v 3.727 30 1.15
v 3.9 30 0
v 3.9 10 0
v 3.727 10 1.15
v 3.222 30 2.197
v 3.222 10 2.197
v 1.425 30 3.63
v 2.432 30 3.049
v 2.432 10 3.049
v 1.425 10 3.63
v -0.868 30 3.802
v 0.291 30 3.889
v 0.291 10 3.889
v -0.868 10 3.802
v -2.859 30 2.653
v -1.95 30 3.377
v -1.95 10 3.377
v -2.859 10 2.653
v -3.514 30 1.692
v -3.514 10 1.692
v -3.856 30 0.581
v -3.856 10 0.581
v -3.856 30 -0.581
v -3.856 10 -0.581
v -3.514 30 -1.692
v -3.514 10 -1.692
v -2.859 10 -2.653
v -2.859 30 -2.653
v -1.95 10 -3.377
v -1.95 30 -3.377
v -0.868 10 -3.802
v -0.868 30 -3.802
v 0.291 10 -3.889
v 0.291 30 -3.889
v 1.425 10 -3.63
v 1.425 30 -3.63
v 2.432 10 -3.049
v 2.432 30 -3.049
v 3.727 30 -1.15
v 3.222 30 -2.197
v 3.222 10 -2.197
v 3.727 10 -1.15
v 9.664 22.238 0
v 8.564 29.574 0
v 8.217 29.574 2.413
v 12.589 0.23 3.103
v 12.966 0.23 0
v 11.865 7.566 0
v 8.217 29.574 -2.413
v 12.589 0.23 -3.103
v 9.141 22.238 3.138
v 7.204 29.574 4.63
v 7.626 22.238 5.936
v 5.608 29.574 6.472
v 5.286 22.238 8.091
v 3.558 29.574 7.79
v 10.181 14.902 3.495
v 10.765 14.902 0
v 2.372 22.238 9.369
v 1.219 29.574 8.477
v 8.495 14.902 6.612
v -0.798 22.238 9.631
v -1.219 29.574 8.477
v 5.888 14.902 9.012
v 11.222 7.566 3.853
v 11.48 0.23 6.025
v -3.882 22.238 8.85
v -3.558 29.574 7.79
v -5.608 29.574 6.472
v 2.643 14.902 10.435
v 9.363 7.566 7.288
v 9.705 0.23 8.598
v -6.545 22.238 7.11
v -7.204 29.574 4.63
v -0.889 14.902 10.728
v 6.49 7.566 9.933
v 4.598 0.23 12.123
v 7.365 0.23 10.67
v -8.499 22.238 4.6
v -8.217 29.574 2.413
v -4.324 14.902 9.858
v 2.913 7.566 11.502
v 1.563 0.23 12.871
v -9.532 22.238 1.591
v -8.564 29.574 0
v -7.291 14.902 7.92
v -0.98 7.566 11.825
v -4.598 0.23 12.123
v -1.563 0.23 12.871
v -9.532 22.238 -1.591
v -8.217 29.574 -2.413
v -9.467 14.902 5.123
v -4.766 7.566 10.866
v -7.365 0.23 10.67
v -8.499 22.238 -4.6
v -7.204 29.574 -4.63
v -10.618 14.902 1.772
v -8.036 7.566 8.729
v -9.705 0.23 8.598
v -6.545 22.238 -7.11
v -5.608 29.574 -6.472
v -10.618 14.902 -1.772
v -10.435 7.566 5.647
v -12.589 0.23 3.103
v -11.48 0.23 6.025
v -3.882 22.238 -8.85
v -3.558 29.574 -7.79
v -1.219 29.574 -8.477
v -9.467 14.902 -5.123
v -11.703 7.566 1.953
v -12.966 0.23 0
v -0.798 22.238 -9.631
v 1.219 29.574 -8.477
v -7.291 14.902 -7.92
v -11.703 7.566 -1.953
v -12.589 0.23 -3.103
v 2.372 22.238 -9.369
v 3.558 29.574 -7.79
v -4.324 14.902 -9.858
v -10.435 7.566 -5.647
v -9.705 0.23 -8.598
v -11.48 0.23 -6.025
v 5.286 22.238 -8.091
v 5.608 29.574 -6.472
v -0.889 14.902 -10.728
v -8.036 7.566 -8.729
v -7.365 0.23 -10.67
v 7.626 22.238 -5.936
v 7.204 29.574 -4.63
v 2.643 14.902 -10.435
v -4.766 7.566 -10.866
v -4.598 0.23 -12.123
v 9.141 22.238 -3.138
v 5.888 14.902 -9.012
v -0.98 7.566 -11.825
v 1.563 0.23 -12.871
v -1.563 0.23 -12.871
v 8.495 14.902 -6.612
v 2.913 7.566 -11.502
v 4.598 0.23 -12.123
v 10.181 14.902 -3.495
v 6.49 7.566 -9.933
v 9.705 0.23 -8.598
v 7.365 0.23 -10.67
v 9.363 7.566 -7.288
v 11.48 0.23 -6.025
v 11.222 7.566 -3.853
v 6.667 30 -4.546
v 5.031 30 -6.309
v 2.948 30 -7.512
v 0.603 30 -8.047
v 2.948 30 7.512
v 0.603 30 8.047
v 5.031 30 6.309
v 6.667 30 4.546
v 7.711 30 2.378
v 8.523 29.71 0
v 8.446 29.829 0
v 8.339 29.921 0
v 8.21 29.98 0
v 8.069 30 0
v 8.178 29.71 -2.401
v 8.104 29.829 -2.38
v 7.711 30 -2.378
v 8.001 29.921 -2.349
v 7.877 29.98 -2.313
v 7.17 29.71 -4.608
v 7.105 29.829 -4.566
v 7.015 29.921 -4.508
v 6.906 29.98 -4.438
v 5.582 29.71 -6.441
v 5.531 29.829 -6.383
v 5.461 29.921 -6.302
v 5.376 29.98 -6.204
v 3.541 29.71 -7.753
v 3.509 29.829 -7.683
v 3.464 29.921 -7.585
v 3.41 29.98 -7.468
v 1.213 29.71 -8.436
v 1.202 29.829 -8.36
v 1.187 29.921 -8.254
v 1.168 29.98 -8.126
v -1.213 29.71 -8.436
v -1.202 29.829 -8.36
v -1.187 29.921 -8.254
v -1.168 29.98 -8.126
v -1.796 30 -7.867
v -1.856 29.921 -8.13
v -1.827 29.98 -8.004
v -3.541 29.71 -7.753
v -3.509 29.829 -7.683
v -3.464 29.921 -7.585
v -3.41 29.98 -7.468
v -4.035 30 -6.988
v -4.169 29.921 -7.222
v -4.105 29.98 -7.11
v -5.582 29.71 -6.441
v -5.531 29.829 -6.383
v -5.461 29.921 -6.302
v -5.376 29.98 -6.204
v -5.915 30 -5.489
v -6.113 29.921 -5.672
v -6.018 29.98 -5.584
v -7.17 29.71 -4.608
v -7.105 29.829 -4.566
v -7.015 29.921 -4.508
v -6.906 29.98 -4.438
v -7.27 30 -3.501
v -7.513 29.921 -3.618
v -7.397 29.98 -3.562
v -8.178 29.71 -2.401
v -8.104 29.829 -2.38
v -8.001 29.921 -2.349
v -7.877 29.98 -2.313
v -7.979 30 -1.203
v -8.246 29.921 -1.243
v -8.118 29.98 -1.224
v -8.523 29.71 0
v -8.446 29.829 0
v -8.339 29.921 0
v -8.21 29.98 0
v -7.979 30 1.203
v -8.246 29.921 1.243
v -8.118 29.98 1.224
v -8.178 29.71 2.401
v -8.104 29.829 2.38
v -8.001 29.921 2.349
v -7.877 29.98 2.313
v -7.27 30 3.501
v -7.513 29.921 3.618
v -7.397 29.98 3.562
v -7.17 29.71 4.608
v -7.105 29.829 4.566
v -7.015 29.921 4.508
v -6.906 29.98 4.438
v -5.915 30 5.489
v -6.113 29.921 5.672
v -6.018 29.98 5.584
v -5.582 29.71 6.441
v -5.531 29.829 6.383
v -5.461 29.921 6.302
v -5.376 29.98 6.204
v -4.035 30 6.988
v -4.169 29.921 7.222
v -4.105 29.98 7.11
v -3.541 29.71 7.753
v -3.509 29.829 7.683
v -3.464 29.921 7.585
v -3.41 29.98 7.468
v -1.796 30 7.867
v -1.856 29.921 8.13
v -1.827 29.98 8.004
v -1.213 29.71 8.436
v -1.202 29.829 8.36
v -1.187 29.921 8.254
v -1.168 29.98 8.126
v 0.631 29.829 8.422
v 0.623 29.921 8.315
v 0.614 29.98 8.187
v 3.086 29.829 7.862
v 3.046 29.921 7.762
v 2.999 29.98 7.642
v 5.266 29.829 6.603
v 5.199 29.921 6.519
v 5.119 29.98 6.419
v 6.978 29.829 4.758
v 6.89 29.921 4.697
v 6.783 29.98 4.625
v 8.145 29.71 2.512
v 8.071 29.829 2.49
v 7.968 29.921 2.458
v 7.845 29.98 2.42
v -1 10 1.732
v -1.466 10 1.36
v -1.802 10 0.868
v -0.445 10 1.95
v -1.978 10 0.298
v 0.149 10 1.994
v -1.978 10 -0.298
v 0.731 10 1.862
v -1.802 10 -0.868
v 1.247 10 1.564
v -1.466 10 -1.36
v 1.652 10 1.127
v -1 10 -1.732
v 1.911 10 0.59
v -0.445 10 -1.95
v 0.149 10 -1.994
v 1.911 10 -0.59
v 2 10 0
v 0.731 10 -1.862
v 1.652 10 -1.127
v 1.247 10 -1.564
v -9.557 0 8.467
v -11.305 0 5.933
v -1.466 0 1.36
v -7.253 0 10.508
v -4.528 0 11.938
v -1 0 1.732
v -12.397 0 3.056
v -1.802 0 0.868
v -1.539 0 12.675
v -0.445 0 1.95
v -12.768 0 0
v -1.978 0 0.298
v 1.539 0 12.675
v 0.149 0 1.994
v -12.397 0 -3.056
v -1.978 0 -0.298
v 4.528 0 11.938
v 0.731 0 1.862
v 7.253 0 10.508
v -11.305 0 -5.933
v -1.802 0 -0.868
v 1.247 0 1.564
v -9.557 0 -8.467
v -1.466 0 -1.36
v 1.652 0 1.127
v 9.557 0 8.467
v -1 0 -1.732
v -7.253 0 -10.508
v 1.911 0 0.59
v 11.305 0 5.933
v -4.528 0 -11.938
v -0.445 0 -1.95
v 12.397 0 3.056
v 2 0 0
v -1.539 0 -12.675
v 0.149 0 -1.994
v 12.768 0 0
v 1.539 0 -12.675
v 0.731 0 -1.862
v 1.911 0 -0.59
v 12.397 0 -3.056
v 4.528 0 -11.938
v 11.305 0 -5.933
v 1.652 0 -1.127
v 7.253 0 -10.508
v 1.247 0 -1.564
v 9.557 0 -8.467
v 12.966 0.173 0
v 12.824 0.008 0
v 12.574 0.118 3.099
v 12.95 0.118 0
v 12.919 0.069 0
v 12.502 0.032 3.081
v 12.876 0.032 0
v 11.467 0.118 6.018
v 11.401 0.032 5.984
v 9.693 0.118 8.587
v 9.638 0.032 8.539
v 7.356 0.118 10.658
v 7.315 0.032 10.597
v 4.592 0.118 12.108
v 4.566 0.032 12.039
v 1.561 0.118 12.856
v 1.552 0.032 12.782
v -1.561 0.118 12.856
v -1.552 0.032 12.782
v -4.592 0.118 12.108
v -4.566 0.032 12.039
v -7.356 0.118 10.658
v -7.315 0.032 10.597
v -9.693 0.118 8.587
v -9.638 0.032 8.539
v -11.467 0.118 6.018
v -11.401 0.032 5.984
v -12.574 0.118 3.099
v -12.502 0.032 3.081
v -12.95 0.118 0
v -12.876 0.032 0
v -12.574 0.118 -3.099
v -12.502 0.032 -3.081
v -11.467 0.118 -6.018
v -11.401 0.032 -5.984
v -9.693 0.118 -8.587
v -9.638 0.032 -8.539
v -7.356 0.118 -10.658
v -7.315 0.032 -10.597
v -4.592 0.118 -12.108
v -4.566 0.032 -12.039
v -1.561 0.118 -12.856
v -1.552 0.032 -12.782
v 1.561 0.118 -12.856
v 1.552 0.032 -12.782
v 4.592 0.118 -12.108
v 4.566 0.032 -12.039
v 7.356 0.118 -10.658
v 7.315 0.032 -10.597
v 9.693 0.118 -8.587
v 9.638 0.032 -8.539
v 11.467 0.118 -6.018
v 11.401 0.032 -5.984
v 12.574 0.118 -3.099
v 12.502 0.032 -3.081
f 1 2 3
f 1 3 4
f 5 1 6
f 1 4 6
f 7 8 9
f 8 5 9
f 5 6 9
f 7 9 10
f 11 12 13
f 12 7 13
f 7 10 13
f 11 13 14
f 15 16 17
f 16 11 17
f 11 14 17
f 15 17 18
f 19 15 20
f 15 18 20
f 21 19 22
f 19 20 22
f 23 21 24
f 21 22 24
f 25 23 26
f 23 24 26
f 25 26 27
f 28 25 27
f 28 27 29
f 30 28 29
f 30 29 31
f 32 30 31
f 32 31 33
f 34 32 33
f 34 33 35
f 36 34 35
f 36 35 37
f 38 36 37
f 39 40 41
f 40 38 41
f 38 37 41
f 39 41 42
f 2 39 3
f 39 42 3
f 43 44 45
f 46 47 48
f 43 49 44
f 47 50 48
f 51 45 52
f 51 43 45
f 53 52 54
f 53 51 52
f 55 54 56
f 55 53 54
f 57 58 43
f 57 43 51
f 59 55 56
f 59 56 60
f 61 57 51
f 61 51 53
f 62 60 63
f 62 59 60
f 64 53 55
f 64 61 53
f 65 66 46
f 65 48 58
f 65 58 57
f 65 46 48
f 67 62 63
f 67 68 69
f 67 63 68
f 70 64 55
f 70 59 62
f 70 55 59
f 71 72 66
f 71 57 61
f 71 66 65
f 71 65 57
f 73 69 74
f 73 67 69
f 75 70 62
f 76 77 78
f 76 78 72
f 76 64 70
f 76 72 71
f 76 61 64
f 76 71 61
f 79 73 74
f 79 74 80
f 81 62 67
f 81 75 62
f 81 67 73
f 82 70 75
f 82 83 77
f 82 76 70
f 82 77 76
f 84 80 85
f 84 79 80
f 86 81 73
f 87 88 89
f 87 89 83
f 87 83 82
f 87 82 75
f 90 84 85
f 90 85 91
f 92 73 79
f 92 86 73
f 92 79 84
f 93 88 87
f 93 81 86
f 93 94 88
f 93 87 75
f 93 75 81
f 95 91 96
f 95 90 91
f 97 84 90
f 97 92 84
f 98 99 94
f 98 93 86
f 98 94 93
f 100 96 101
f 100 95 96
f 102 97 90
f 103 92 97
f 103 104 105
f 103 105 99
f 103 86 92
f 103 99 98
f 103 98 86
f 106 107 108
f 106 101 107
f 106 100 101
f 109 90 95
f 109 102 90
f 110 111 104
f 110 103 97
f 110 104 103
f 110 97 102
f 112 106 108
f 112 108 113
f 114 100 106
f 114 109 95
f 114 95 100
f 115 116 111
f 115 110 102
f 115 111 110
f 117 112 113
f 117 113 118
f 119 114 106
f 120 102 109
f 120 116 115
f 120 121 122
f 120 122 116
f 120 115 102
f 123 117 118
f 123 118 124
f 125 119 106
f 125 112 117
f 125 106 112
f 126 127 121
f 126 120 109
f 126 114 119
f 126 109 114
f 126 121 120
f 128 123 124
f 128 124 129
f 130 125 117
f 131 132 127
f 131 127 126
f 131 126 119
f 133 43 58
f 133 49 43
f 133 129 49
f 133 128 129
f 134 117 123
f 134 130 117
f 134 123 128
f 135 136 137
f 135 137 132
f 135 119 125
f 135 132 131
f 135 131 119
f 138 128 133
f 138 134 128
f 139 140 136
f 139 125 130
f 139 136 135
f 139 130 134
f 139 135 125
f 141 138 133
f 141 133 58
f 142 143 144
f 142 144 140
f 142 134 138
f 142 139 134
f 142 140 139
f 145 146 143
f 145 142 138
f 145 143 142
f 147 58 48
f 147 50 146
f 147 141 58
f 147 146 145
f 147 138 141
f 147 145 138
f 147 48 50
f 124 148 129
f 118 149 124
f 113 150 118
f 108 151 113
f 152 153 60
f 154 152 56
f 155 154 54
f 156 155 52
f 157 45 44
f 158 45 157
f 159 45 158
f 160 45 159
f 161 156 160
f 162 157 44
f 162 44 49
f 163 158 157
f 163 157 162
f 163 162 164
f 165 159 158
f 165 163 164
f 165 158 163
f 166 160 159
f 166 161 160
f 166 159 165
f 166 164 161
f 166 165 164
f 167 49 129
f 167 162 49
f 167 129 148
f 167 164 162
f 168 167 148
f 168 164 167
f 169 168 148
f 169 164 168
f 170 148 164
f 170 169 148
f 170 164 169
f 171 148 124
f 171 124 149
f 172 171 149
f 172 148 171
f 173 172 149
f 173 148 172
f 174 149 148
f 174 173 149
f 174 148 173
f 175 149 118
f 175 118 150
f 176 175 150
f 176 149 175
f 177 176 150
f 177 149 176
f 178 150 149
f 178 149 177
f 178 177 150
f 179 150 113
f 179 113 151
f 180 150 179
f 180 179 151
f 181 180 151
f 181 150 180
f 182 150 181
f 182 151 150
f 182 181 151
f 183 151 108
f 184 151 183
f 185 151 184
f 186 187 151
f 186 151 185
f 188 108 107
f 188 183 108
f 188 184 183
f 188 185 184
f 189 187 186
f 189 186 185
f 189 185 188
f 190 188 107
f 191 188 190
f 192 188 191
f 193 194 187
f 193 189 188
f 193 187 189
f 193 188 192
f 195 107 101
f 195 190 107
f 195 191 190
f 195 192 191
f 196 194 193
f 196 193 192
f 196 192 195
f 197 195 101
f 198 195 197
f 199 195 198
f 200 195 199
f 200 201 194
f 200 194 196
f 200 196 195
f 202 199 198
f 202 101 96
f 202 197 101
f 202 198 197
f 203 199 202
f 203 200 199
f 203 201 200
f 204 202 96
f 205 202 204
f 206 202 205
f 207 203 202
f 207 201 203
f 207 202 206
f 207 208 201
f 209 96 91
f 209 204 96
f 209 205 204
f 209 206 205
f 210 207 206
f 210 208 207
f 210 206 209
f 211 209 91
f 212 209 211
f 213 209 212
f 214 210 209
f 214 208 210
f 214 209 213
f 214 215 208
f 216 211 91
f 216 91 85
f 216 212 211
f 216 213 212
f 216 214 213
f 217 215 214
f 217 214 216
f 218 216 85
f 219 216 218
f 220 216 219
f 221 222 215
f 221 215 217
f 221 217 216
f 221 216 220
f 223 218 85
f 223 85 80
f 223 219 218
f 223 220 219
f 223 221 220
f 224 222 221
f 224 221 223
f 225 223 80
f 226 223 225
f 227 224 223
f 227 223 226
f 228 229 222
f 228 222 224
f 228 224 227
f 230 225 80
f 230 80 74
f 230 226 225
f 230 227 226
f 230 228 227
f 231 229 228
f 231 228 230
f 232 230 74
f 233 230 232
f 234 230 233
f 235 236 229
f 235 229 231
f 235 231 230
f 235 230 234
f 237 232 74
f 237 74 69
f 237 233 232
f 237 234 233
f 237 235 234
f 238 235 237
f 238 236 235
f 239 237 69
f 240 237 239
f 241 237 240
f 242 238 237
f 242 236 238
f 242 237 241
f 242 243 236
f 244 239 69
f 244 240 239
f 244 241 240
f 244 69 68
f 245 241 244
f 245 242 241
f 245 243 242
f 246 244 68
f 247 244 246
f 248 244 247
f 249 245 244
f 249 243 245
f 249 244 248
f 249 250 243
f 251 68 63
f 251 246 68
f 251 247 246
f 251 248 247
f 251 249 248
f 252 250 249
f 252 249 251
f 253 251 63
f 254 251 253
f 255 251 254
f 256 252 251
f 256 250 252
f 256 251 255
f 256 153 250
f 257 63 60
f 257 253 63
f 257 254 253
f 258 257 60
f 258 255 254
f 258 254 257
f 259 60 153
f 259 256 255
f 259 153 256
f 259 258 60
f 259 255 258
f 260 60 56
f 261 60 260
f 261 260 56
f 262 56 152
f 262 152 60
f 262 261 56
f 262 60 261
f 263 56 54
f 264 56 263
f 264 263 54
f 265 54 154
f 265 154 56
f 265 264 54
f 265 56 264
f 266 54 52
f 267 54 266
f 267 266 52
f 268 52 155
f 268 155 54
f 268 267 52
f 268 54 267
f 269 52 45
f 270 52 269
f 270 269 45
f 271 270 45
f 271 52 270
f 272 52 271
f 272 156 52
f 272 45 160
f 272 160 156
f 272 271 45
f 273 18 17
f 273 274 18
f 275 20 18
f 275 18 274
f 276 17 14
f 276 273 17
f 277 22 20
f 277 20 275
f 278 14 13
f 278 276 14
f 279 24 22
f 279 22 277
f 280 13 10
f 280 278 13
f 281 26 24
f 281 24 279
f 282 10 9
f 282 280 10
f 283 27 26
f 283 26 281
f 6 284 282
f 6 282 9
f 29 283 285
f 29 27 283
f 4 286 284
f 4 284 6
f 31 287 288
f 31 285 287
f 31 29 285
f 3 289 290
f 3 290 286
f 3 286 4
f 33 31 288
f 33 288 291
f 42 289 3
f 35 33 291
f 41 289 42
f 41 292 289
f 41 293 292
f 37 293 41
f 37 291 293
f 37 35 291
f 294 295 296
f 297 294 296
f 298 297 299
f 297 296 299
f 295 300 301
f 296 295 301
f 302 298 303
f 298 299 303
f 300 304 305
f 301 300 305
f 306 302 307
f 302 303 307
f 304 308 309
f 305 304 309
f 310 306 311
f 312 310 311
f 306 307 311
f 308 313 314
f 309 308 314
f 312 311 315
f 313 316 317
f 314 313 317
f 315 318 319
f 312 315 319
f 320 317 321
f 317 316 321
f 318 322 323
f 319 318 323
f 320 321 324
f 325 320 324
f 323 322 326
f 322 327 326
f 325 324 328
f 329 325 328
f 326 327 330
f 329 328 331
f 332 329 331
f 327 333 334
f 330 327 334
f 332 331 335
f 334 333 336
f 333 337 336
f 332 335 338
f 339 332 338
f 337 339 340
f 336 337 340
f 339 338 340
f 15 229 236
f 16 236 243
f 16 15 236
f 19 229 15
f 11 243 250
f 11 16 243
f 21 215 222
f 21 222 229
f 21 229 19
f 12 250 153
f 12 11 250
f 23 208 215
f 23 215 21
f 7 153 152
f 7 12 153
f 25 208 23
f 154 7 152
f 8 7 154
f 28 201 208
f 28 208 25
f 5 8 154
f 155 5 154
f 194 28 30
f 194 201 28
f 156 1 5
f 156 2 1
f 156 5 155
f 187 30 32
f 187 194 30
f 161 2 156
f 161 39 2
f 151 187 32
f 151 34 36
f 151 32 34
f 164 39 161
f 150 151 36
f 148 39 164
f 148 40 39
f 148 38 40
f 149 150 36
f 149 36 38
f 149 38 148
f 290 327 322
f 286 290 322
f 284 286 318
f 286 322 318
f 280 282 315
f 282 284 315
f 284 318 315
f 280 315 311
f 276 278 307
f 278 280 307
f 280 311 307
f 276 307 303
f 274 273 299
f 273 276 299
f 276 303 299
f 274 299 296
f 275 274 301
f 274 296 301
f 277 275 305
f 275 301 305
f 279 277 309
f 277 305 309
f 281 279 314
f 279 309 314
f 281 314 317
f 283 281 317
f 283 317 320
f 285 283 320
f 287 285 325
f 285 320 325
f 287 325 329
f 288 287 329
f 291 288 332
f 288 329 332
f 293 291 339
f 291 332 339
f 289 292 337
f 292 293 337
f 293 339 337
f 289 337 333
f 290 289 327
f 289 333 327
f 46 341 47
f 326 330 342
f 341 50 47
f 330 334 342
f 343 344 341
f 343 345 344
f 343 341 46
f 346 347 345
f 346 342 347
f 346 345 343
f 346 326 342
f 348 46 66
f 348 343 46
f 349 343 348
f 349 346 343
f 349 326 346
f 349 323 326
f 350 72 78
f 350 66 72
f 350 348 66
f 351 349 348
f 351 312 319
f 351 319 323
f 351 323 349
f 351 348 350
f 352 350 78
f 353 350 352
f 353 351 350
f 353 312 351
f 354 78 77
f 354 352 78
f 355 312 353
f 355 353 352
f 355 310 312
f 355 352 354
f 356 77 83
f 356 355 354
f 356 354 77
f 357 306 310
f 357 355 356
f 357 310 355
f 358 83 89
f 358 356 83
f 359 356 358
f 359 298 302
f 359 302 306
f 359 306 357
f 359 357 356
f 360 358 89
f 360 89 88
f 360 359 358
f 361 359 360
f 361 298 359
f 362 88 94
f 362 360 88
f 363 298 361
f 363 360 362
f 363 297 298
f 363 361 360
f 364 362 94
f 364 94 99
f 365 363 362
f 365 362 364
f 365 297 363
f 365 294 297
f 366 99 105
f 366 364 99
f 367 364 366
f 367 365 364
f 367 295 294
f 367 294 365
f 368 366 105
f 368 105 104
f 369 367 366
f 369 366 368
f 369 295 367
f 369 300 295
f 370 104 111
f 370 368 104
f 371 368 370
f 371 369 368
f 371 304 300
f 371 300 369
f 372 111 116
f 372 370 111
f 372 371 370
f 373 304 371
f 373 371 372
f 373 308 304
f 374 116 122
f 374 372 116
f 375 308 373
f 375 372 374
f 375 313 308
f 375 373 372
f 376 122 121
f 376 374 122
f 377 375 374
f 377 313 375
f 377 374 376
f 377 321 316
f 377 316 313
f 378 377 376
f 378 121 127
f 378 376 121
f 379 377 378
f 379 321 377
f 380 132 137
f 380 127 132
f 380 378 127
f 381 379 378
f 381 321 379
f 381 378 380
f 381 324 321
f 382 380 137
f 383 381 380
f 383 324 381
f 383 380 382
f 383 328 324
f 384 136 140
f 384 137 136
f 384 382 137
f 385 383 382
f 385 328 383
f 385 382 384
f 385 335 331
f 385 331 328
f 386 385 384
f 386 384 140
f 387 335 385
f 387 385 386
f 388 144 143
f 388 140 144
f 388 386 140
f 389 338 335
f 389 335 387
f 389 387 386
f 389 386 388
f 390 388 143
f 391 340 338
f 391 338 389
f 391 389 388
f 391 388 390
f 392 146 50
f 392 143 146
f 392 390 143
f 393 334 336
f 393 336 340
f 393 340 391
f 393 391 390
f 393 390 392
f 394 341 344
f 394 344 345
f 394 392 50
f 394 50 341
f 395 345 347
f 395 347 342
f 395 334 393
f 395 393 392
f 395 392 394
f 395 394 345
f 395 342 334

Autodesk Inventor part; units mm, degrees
ref_plane "YZ Plane" through (0, 0, 0) normal (1, 0, 0) x (0, 1, 0)
ref_plane "XZ Plane" through (0, 0, 0) normal (0, 1, 0) x (-1, 0, 0)
ref_plane "XY Plane" through (0, 0, 0) normal (0, 0, 1) x (1, 0, 0)
sketch "Эскиз1" plane through (0, 0, 0) normal (0, 0, 1) x (1, 0, 0)
  line L0 (0, 0) -> (0, 30)
  line L1 (3.9, 30) -> (8.5, 30)
  line L2 (8.5, 30) -> (13, 0)
  line L3 (0, 0) -> (13, 0)
  line L4 (3.9, 30) -> (3.9, 10)
  line L5 (3.9, 10) -> (2, 10)
  line L6 (2, 10) -> (2, 0)
  dimension "d0" = 30
  dimension "d1" = 4
  dimension "d2" = 7.8
  dimension "d3" = 17
  dimension "d4" = 26
  dimension "d8" = 10
revolve "Вращение1" add sketch "Эскиз1" angle 360 about axis through (0, 0, 0) along (0, 1, 0)
fillet "Сопряжение1" radius 0.2 1 edges at (-13, 0, 0)
fillet "Сопряжение2" radius 0.5 1 edges at (-8.5, 30, 0)
properties part number "ножки"
